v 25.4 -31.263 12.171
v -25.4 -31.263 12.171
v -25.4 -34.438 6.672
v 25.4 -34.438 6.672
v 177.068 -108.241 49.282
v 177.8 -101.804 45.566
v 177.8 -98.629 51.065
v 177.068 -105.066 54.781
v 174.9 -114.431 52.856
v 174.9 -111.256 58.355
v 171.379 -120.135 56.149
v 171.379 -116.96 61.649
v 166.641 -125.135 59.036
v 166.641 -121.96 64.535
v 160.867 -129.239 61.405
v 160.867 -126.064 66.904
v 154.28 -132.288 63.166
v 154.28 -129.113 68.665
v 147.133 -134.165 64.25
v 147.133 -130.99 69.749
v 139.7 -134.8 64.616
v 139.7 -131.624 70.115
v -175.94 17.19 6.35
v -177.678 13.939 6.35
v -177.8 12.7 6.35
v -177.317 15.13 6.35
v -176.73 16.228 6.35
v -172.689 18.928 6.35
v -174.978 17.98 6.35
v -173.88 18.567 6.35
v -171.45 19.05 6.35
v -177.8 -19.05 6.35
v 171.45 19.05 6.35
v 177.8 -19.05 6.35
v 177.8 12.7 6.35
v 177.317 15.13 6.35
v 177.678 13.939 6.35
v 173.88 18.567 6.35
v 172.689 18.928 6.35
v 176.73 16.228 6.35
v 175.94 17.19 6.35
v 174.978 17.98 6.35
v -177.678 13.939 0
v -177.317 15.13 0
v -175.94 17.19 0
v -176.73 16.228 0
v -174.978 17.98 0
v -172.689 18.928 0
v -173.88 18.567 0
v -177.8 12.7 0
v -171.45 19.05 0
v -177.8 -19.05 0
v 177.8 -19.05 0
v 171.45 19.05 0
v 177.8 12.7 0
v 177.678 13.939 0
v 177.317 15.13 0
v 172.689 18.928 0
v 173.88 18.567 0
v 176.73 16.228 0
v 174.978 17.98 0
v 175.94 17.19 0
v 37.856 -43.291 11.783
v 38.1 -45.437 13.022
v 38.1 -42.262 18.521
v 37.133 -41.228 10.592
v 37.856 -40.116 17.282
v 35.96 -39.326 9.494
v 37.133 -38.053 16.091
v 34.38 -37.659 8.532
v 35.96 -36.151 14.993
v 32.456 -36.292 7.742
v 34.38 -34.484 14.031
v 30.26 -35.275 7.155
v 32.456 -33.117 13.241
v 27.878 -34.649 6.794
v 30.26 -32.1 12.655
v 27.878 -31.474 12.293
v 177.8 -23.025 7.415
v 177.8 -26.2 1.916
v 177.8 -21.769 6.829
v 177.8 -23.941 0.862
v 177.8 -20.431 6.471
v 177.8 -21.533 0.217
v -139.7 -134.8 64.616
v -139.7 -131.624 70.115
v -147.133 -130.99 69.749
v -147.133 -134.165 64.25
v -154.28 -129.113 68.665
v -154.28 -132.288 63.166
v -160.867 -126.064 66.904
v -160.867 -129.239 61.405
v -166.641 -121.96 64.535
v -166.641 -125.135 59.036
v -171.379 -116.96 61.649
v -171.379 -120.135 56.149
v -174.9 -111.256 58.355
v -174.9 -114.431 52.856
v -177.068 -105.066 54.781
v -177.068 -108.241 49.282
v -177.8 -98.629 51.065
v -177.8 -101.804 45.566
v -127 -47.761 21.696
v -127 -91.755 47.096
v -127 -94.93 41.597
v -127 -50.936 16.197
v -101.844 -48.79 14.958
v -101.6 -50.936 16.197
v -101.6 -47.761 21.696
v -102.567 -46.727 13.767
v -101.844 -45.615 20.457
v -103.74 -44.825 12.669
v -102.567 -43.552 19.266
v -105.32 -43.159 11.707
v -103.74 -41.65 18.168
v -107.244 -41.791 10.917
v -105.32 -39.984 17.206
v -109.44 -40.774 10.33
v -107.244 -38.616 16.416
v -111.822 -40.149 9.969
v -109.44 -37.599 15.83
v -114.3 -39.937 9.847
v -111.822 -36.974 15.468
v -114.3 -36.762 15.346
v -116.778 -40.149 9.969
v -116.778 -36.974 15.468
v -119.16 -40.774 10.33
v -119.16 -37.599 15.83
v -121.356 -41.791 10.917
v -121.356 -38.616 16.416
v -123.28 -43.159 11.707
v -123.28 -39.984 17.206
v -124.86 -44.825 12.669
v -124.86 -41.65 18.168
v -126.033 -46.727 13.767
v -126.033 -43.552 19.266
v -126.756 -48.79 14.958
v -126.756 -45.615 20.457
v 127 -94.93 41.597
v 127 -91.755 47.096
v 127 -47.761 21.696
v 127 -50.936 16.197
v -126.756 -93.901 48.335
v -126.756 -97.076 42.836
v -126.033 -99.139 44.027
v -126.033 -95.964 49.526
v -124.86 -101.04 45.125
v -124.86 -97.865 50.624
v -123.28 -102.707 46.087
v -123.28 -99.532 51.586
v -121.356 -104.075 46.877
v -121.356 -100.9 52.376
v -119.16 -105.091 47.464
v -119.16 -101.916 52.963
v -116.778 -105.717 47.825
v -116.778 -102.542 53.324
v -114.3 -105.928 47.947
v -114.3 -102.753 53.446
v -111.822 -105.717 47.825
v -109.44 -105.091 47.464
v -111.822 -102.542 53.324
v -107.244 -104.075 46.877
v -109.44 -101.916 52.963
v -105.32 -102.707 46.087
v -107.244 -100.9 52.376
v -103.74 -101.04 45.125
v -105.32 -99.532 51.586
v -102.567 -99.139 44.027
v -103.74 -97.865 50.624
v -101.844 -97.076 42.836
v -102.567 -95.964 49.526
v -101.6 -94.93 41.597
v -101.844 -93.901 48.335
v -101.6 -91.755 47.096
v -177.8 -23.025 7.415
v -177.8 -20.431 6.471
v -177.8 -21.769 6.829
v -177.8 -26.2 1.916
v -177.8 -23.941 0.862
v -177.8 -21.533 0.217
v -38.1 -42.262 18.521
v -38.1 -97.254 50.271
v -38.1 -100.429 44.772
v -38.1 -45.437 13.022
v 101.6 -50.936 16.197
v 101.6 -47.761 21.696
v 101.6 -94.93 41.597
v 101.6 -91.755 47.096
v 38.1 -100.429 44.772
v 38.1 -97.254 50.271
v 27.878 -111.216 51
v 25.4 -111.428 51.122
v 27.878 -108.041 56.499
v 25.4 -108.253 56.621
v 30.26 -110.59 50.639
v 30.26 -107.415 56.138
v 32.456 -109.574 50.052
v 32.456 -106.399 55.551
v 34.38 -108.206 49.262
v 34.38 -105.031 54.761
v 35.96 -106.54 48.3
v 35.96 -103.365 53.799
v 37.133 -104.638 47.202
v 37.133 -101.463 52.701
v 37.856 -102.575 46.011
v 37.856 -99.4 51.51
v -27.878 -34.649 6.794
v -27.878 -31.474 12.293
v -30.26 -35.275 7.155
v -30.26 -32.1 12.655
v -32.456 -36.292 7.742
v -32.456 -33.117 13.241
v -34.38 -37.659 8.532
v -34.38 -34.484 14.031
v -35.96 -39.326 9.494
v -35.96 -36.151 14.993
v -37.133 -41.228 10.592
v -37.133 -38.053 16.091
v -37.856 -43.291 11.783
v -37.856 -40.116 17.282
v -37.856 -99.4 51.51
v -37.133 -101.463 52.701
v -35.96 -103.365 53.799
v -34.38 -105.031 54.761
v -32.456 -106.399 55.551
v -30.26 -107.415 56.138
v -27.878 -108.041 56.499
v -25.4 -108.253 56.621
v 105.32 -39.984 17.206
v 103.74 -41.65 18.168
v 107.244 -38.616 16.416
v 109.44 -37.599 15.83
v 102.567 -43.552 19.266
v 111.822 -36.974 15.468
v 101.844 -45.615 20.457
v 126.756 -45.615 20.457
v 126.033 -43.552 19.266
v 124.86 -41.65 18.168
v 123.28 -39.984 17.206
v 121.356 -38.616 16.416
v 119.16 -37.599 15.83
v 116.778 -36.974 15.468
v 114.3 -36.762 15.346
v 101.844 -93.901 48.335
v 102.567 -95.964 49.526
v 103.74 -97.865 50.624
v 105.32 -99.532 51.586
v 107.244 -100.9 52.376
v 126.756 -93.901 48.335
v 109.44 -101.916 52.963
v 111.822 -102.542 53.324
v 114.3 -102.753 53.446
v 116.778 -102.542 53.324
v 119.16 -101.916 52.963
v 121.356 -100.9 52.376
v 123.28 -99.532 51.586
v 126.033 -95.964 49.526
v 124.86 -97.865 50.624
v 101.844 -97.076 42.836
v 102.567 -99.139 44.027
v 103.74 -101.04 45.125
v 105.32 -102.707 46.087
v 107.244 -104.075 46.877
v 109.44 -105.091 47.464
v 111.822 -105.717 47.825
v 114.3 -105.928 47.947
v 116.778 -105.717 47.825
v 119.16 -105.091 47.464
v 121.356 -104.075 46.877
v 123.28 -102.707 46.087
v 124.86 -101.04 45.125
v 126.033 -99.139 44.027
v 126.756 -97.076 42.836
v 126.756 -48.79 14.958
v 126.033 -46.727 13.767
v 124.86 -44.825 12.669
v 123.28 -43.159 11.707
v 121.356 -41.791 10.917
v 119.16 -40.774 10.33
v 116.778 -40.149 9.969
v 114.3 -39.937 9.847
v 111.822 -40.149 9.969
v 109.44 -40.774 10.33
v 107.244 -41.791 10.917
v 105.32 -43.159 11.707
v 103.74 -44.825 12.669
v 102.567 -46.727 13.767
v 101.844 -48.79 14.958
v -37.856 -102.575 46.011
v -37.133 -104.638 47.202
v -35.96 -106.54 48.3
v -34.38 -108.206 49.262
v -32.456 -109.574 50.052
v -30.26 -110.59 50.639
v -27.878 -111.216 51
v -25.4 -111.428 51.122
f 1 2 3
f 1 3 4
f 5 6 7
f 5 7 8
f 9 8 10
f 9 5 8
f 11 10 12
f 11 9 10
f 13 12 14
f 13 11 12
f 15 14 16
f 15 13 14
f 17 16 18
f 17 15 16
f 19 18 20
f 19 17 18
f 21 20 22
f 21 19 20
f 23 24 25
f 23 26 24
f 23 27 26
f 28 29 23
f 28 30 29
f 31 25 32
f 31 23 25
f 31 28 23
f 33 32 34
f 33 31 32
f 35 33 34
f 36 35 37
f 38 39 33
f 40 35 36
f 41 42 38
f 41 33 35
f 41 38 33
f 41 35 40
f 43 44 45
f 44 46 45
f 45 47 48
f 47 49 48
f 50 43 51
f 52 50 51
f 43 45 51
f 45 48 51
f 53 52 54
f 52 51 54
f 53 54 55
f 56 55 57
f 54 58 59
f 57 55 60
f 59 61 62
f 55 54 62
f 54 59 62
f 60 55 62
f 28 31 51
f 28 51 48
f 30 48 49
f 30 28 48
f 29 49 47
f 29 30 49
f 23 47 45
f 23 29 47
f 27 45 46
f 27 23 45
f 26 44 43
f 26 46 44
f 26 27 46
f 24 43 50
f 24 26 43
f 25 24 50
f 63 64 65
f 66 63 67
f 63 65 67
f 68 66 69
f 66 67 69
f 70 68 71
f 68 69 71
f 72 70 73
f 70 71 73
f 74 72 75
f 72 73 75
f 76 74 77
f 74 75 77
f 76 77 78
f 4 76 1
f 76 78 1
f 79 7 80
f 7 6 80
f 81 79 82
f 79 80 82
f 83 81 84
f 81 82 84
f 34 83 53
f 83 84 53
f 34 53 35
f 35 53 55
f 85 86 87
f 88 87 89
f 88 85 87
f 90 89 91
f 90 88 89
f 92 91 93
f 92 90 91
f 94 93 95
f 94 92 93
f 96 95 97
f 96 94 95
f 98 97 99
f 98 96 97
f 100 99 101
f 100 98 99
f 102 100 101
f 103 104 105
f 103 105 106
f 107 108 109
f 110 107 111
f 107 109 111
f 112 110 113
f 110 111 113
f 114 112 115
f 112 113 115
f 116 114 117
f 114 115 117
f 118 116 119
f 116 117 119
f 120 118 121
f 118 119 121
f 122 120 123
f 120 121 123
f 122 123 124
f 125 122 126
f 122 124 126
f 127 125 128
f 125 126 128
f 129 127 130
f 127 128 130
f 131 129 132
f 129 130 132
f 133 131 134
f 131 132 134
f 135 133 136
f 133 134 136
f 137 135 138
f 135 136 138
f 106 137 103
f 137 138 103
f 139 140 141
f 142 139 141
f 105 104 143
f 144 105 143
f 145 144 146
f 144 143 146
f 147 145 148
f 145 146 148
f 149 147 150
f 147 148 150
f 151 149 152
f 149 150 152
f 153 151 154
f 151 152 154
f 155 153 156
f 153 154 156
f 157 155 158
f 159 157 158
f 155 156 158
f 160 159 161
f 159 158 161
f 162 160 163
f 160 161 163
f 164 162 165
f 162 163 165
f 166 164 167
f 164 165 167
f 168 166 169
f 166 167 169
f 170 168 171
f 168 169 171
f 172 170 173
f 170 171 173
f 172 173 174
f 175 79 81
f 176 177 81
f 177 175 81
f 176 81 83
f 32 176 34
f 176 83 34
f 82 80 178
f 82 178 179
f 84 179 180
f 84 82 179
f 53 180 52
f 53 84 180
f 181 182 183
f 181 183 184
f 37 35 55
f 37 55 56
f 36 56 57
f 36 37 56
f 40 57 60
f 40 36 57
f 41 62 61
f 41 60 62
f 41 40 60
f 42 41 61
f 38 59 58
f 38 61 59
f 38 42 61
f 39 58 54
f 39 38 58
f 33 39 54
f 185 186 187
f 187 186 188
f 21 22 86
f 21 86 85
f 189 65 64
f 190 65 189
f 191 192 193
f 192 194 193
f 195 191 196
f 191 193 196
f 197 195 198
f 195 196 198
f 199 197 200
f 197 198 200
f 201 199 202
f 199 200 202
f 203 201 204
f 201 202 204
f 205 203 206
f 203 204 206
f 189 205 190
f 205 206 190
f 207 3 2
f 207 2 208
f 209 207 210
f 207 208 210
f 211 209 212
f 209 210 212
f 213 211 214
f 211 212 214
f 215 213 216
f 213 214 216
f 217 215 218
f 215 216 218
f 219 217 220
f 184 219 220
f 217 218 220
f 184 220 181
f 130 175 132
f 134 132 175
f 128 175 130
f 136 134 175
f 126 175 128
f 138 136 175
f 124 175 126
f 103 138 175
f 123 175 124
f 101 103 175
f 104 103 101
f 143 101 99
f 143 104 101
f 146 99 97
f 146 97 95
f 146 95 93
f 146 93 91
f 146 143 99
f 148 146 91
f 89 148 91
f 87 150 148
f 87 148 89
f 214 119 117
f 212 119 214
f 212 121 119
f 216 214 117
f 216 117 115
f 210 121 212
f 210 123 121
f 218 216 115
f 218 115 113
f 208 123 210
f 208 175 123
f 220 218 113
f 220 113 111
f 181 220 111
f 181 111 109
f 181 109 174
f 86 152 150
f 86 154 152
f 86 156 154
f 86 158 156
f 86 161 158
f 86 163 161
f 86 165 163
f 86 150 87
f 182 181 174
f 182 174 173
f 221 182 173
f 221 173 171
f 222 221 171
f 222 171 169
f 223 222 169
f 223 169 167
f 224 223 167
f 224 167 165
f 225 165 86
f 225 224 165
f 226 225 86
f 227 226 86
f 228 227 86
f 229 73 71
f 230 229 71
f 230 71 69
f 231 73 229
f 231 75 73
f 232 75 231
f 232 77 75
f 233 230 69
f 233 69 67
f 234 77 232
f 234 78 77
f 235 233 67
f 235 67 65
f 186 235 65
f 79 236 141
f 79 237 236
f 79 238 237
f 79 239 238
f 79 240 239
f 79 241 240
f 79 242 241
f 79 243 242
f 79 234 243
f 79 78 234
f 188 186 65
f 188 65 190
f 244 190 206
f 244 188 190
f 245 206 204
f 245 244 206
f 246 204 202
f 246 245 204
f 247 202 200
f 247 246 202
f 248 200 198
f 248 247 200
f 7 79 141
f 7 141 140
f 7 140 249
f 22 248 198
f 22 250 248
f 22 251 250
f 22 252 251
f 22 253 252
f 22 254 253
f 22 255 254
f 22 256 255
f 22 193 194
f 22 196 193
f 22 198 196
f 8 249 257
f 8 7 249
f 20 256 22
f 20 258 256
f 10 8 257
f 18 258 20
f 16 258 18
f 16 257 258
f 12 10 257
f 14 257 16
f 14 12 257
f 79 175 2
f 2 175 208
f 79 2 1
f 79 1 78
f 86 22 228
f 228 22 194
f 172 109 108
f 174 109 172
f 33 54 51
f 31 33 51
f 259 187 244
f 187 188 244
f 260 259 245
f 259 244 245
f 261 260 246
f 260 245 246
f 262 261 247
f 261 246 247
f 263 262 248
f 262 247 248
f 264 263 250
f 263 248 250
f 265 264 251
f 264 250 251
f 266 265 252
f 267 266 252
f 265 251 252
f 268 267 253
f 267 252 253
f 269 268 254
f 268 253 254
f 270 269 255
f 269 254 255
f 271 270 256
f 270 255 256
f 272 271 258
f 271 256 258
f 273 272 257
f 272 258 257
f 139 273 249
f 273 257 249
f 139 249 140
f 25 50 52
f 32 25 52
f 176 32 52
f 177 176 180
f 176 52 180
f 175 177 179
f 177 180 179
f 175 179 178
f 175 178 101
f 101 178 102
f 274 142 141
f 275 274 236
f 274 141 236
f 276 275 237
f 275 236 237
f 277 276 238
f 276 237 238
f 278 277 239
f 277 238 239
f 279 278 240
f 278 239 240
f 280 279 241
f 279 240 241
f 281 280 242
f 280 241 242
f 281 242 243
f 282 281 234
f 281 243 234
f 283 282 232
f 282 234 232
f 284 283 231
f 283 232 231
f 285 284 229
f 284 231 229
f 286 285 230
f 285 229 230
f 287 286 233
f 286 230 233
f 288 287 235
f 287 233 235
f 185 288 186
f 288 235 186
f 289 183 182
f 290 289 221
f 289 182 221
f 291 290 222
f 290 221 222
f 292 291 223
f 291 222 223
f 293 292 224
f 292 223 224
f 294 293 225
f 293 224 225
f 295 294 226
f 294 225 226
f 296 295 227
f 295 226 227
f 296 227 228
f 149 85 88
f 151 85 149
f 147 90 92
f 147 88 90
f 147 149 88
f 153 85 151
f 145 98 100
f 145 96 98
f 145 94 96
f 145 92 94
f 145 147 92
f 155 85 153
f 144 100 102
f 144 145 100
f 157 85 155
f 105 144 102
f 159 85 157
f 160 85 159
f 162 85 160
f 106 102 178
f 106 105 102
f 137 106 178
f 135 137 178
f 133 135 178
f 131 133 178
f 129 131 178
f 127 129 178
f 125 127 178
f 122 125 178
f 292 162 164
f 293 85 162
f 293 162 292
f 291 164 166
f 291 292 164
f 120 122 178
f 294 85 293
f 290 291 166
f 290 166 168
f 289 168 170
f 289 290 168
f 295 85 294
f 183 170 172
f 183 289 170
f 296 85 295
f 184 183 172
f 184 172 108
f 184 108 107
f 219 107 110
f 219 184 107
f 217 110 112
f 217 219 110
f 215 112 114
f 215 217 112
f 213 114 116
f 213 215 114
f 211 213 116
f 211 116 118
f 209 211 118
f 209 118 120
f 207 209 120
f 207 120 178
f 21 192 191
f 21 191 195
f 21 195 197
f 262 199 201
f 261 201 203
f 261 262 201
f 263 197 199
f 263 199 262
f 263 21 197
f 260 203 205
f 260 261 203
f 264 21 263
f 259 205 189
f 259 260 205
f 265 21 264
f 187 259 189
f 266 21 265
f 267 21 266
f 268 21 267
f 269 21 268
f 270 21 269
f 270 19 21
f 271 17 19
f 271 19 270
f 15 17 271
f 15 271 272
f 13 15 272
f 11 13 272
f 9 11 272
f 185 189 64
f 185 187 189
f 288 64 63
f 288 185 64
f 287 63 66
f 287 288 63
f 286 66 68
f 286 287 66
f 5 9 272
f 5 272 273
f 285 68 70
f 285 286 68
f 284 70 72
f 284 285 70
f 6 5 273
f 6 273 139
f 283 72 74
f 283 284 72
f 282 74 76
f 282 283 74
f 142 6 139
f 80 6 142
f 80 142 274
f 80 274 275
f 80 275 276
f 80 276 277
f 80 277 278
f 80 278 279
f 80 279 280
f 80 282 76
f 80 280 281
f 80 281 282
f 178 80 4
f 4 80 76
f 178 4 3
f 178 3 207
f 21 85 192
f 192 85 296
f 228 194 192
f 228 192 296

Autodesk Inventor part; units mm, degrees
ref_plane "YZ Plane" through (0, 0, 0) normal (1, 0, 0) x (0, 1, 0)
ref_plane "XZ Plane" through (0, 0, 0) normal (0, 1, 0) x (-1, 0, 0)
ref_plane "XY Plane" through (0, 0, 0) normal (0, 0, 1) x (1, 0, 0)
sketch "Sketch1" plane through (0, 0, 0) normal (0, 0, 1) x (1, 0, 0)
  line L0 (-177.8, -19.05) -> (177.8, -19.05)
  line L1 (177.8, -19.05) -> (177.8, 19.05)
  line L2 (177.8, 19.05) -> (-177.8, 19.05)
  line L3 (-177.8, 19.05) -> (-177.8, -19.05)
  line L4 (-177.8, -19.05) -> (177.8, 19.05) construction
  line L5 (177.8, -19.05) -> (-177.8, 19.05) construction
  point P0 (0, 0)
  point P1 (0, 0)
  dimension "d31" = 355.6
  dimension "d32" = 38.1
extrude "Plate1" add sketch "Sketch1" along normal blind 6.35
sketch "Sketch3" plane through (177.8, -23.0251, 7.4151) normal (0, -0.5, -0.8660254) x (1, 0, 0)
  line L0 (-355.6, 0) -> (0, 0)
  line L1 (0, 0) -> (0, 125.3998)
  line L2 (0, 125.3998) -> (-355.6, 125.3998)
  line L3 (-355.6, 125.3998) -> (-355.6, 0)
edge flange "Flange2" height 139.7 angle 30 thickness 6.35 bend radius 7.9502 thickness toward (0, -0.5, -0.8660254) relief tear relief width 6.35 relief depth 3.175 edges at (0, -19.05, 6.35) wall of the first edge with corners at (-177.8, -23.0251, 7.4151) (177.8, -23.0251, 7.4151) (177.8, -131.6245, 70.115) (-177.8, -131.6245, 70.115)
bend "Bend2"
corner "Corner2"
fillet "Corner Round1" radius 6.35 2 edges at (177.8, 19.05, 3.175) (-177.8, 19.05, 3.175)
fillet "Corner Round2" radius 38.1 2 edges at (177.8, -133.212, 67.3654) (-177.8, -133.212, 67.3654)
sketch "Sketch4" plane through (-177.8, -23.0251, 7.4151) normal (0, 0.5, 0.8660254) x (1, 0, 0)
  line L0 (152.4, -9.5123) -> (203.2, -9.5123)
  line L1 (215.9, -22.2123) -> (215.9, -85.7123)
  line L2 (203.2, -98.4123) -> (152.4, -98.4123)
  line L3 (139.7, -85.7123) -> (139.7, -22.2123)
  line L4 (139.7, -9.5123) -> (215.9, -98.4123) construction
  line L5 (215.9, -9.5123) -> (139.7, -98.4123) construction
  line L6 (38.1, -125.3998) -> (317.5, -125.3998) construction
  arc A0 (152.4, -9.5123) -> (139.7, -22.2123) centre (152.4, -22.2123) ccw
  arc A1 (215.9, -22.2123) -> (203.2, -9.5123) centre (203.2, -22.2123) ccw
  arc A2 (203.2, -98.4123) -> (215.9, -85.7123) centre (203.2, -85.7123) ccw
  arc A3 (139.7, -85.7123) -> (152.4, -98.4123) centre (152.4, -85.7123) ccw
  line L7 (63.5, -79.3623) -> (63.5, -28.5623) construction
  line L8 (50.8, -79.3623) -> (50.8, -28.5623)
  line L9 (76.2, -28.5623) -> (76.2, -79.3623)
  arc A4 (50.8, -79.3623) -> (76.2, -79.3623) centre (63.5, -79.3623) ccw
  arc A5 (76.2, -28.5623) -> (50.8, -28.5623) centre (63.5, -28.5623) ccw
  line L10 (0, -87.2998) -> (0, 0) projected
  line L11 (177.8, -53.9623) -> (177.8, -125.3998) construction
  line L12 (292.1, -79.3623) -> (292.1, -28.5623) construction
  line L13 (304.8, -79.3623) -> (304.8, -28.5623)
  line L14 (279.4, -28.5623) -> (279.4, -79.3623)
  arc A6 (279.4, -79.3623) -> (304.8, -79.3623) centre (292.1, -79.3623) ccw
  arc A7 (304.8, -28.5623) -> (279.4, -28.5623) centre (292.1, -28.5623) ccw
  point P0 (63.5, -53.9623)
  dimension "d45" = 26.9875
  dimension "d46" = 76.2
  dimension "d47" = 88.9
  dimension "d50" = 12.7
  dimension "d51" = 12.7
  dimension "d52" = 50.8
  dimension "d53" = 63.5
  dimension "d54" = 25.4
extrude "Cut1" cut sketch "Sketch4" against normal blind 6.35
equation "\"d48\" = Thickness"
equation "\"d15\" = Thickness"
equation "\"d33\" = BendReliefWidth"
equation "\"d34\" = BendReliefDepth"
equation "\"d35\" = MinimumRemnant"
equation "\"d36\" = TransitionRadius"
equation "\"d39\" = BendRadius"
equation "\"d40\" = CornerReliefSize"
equation "\"d41\" = GapSize"
equation "\"d42\" = JacobiRadiusSize"
equation "\"BendReliefWidth\" = Thickness"
equation "\"BendReliefDepth\" = 0.5 * Thickness"
equation "\"CornerReliefSize\" = 4 * Thickness"
equation "\"MinimumRemnant\" = 2 * Thickness"
equation "\"TransitionRadius\" = BendRadius"
equation "\"JacobiRadiusSize\" = Thickness"
equation "\"GapSize\" = Thickness"
equation "\"Thickness\" = 6.35"
equation "\"BendRadius\" = 7.9502"
properties part number "Model-4_Sheet Stifferner" material "SS304"
